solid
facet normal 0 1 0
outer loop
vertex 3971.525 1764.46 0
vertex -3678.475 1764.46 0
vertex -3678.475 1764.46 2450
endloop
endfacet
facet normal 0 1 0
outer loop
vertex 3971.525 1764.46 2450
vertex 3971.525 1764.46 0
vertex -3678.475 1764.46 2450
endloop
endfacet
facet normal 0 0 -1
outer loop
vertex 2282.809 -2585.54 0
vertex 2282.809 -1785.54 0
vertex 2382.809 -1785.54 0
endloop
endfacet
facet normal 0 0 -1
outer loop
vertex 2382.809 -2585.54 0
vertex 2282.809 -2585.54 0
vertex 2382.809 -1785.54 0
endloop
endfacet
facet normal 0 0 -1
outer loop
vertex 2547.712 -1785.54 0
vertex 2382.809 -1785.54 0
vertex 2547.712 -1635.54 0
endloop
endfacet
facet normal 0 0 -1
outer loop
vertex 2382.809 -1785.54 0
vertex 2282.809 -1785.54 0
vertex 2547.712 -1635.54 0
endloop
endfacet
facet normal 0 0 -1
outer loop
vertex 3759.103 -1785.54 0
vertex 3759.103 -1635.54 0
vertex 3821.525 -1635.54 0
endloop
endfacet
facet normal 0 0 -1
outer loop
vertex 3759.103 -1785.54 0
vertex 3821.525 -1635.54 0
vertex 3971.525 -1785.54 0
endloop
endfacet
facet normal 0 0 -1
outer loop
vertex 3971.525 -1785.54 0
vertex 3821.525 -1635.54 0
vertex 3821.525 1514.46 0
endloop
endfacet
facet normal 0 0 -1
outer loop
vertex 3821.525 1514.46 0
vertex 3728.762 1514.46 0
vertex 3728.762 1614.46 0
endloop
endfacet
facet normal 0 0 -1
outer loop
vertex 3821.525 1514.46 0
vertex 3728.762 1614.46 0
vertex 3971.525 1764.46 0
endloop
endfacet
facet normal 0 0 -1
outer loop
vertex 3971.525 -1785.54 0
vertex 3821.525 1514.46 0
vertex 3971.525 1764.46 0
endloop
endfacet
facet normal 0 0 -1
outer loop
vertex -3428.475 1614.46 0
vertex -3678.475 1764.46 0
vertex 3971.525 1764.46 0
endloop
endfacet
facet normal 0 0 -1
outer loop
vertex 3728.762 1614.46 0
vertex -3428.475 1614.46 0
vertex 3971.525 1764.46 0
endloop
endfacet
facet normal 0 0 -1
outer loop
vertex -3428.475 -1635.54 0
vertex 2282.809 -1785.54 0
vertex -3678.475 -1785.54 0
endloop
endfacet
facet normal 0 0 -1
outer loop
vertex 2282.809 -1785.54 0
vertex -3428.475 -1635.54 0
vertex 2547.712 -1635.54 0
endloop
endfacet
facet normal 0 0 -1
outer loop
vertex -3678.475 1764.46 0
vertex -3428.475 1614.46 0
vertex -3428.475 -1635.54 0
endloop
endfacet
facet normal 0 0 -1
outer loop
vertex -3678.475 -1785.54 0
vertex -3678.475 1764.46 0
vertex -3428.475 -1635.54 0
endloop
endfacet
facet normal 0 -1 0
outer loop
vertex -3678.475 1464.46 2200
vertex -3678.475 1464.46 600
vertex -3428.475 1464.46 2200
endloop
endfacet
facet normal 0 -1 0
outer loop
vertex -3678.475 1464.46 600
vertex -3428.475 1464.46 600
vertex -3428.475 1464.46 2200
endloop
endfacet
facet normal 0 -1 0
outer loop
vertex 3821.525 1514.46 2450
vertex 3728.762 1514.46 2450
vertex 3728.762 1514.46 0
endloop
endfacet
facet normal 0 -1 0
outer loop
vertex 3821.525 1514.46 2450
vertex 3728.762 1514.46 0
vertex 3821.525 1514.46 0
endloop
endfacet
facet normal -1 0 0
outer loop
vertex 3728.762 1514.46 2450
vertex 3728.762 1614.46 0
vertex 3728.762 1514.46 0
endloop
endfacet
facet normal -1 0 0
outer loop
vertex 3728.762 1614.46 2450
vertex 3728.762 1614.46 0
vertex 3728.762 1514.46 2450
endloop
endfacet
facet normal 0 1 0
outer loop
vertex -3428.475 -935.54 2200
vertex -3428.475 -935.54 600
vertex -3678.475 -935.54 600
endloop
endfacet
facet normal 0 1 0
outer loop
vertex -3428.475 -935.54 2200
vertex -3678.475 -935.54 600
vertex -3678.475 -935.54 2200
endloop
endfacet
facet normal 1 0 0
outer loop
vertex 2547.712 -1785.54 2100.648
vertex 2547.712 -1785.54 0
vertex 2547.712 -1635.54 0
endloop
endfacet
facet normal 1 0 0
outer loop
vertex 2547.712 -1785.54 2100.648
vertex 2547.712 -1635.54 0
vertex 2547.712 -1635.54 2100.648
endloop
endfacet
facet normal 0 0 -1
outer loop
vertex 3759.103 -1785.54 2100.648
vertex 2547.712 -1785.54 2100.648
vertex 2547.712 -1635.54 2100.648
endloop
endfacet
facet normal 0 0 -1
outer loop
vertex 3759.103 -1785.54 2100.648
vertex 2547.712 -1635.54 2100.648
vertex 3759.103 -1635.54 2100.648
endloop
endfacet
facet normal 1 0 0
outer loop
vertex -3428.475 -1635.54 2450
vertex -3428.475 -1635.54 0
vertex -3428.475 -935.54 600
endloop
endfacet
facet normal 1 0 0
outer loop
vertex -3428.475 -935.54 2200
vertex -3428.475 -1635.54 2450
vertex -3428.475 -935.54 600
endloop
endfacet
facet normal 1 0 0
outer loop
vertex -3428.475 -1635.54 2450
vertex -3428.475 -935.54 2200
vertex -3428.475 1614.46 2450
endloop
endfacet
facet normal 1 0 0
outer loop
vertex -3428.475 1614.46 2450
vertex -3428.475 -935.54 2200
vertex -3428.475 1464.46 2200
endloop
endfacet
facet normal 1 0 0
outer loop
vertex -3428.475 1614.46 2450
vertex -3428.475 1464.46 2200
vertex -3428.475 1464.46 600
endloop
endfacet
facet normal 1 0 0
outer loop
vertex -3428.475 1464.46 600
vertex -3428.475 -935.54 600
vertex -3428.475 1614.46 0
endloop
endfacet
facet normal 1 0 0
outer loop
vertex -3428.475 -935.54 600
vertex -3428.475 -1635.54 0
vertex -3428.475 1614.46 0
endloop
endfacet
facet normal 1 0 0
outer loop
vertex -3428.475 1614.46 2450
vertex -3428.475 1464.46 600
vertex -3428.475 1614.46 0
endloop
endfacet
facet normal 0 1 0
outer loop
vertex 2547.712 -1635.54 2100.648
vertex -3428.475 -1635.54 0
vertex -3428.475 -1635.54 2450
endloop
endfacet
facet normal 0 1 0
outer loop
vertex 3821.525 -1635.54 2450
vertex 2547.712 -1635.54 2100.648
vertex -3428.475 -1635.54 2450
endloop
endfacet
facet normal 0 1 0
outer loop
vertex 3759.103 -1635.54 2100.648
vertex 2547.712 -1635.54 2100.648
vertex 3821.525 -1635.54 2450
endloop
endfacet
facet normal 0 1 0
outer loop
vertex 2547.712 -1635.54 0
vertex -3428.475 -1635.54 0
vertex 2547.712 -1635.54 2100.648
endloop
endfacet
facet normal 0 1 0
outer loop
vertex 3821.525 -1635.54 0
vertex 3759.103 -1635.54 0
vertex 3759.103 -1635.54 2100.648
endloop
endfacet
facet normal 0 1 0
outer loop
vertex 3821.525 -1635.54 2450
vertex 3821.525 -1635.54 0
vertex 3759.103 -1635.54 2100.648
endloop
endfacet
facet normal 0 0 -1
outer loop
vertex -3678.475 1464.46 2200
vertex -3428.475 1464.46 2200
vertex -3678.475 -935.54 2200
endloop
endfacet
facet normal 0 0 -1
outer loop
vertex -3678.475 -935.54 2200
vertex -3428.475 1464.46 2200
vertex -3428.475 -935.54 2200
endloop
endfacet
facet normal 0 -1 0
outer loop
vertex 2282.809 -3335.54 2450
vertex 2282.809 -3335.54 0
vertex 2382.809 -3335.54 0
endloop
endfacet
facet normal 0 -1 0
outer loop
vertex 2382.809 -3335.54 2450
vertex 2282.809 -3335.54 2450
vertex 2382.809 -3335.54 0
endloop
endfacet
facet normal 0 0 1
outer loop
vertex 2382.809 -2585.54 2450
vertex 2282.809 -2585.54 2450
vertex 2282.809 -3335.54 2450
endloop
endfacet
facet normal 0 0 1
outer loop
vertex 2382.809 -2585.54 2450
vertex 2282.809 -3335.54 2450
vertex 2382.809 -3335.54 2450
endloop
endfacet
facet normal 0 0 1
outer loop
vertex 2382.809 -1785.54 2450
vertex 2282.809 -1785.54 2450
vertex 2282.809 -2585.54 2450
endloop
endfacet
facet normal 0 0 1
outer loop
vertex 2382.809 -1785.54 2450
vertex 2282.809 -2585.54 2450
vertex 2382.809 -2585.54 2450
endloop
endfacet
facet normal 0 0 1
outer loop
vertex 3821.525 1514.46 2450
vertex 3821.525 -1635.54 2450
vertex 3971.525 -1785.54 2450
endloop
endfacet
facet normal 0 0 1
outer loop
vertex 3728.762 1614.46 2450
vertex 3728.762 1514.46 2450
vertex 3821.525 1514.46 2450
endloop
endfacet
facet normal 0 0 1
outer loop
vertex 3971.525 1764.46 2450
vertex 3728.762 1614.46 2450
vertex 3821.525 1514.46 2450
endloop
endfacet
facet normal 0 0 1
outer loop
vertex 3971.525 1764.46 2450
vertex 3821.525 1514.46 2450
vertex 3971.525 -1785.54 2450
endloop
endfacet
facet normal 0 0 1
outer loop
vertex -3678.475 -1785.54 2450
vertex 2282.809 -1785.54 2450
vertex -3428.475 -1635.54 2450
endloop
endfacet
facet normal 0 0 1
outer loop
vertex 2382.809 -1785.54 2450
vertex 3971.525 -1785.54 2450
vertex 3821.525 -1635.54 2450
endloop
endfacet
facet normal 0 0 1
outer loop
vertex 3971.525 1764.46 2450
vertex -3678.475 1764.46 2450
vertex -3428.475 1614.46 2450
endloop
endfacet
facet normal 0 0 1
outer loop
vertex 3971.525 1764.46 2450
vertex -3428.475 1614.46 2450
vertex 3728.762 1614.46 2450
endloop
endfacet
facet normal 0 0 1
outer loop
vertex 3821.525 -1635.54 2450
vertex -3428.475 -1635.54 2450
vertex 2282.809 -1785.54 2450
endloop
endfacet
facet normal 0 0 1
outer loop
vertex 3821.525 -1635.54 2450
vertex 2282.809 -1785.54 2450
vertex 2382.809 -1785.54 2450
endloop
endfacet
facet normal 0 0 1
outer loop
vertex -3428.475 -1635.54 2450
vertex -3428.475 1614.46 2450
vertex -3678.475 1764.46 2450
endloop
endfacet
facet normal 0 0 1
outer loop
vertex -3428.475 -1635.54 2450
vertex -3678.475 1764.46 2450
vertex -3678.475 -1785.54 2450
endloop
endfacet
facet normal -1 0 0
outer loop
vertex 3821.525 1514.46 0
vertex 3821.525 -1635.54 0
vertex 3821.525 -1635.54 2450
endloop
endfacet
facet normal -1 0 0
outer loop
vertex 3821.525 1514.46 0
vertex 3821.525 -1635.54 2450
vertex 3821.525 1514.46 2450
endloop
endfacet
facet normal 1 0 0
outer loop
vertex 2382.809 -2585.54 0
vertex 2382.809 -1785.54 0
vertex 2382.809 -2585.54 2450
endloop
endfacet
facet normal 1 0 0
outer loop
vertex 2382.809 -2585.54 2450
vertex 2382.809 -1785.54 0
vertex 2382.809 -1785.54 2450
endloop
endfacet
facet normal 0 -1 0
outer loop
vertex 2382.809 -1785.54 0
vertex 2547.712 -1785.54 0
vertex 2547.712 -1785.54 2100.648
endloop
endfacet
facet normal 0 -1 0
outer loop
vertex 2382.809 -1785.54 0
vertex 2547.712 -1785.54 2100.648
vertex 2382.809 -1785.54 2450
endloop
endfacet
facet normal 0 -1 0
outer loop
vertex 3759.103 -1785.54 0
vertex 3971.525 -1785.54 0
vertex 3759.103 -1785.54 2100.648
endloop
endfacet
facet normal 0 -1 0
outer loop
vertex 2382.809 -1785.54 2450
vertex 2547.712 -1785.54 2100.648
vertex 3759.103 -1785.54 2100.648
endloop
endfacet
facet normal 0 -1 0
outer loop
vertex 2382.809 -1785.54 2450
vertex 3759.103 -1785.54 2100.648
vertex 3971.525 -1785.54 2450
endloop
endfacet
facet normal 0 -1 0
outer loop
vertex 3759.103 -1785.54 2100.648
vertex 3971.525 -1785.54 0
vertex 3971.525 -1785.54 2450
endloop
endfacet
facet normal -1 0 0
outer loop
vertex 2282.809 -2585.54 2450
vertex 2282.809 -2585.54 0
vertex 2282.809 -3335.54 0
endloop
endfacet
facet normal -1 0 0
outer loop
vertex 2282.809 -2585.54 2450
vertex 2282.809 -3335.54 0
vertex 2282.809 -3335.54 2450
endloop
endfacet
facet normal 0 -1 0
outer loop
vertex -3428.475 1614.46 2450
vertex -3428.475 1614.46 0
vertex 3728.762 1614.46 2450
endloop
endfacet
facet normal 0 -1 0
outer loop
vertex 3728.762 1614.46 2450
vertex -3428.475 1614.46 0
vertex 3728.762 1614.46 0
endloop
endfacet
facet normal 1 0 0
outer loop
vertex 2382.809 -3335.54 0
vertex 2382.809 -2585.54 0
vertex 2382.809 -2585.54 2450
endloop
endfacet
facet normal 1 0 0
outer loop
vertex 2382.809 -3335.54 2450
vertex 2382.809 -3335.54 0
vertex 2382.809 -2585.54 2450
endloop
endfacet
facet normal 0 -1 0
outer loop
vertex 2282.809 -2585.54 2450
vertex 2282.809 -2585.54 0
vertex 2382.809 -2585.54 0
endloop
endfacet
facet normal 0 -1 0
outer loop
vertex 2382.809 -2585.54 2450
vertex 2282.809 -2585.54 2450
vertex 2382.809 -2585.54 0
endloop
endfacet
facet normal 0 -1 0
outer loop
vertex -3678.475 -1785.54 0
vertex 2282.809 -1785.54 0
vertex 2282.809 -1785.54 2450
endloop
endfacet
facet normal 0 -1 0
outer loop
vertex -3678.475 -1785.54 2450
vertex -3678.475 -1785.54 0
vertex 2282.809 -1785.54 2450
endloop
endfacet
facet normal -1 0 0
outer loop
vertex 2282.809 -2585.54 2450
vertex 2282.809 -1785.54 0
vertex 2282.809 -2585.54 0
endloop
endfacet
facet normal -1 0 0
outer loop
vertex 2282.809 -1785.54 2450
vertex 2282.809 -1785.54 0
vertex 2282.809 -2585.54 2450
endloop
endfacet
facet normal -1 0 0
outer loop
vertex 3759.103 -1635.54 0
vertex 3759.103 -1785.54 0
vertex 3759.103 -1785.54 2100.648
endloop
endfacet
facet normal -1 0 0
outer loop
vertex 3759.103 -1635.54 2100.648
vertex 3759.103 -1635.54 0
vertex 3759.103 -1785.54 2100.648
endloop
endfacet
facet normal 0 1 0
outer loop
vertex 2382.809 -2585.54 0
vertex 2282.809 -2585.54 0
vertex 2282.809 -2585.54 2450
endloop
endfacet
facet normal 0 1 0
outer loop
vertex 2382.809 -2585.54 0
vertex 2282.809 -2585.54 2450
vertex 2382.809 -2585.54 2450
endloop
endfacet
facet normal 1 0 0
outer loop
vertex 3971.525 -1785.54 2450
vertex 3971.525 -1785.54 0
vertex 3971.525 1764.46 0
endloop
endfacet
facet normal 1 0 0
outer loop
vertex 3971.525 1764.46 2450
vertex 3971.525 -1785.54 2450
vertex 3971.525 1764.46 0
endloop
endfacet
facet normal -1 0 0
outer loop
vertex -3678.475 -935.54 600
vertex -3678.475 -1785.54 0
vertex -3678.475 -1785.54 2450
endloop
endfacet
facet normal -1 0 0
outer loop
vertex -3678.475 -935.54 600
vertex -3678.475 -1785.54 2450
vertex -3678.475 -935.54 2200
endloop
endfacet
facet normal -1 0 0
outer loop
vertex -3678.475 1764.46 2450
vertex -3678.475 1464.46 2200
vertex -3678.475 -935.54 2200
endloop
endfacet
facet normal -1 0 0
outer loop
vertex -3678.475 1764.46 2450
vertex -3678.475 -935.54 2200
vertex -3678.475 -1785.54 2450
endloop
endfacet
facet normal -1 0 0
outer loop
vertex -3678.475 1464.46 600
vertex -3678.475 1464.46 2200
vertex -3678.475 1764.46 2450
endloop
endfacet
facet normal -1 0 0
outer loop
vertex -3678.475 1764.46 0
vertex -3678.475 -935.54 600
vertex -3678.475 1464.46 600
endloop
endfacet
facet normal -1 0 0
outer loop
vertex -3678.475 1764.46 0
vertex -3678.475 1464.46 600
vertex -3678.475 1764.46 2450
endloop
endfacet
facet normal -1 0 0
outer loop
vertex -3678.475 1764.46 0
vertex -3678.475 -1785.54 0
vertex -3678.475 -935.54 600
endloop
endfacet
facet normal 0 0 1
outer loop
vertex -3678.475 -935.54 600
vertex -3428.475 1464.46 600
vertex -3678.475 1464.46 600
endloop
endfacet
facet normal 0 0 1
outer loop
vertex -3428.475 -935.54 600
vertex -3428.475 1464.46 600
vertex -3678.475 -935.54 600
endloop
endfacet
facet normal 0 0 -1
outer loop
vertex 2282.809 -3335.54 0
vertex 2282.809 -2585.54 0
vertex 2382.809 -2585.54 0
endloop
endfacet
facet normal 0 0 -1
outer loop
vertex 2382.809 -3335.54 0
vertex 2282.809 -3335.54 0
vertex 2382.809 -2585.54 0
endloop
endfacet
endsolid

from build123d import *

# Parameters (mm, degrees)
F0_W      = 7550
F0_H      = 3550
F0_W_2    = 7250
F0_H_2    = 3250
F1_DEPTH  = 2450
F2_W      = 1211.3902568817
F2_H      = 2100.6481647491
F3_DEPTH  = 150
F4_W      = 2400
F4_H      = 1600
F5_DEPTH  = 150
F6_DEPTH  = 100
F7_W      = 92.7624866187
F7_H      = 2450
F8_DEPTH  = 100
F9_W      = 100
F9_H      = 2450
F10_DEPTH = 800
F11_DEPTH = 750


with BuildPart() as f1:
    # F0 (on Top) → F1 (new body)
    with BuildSketch(Plane.XY):
        with Locations((196.5246364295, -10.5402395129)):
            Rectangle(F0_W, F0_H)
        with Locations((196.5246364295, -10.5402395129)):
            Rectangle(F0_W_2, F0_H_2, mode=Mode.SUBTRACT)
    extrude(amount=F1_DEPTH)

    # F2 (on face) → F3 (cut)
    with BuildSketch(Plane.XZ.offset(1785.5402395129)):
        with Locations((3153.4074544907, 1050.3240823746)):
            Rectangle(F2_W, F2_H)
    extrude(amount=-F3_DEPTH, mode=Mode.SUBTRACT)

    # F4 (on face) → F5 (cut)
    with BuildSketch(Plane(origin=(-3578.4753635705, 0, 0), x_dir=(0, -1, 0), z_dir=(-1, 0, 0))):
        with Locations((-264.4597604871, 1400)):
            Rectangle(F4_W, F4_H)
    extrude(amount=-F5_DEPTH, mode=Mode.SUBTRACT)

    # F6 (add): a face of the model
    f6_faces = [f1.faces().sort_by_distance(p)[0] for p in [
        (-3578.4753635705, 1721.3262468347, 1225),
    ]]
    extrude(f6_faces, amount=F6_DEPTH)

    # F7 (on face) → F8 (join)
    with BuildSketch(Plane.XZ.offset(-1614.4597604871)):
        with Locations((3775.1433931202, 1225)):
            Rectangle(F7_W, F7_H)
    extrude(amount=F8_DEPTH)

    # F9 (on face) → F10 (join)
    with BuildSketch(Plane.XZ.offset(1785.5402395129)):
        with Locations((2332.8089237213, 1225)):
            Rectangle(F9_W, F9_H)
    extrude(amount=F10_DEPTH)


with BuildPart() as f11:
    # F11 (new): a face of the model
    f11_faces = [f1.part.faces().sort_by_distance(p)[0] for p in [
        (2332.8089237213, -2585.5402395129, 1225),
    ]]
    extrude(f11_faces, amount=F11_DEPTH)


solid = Compound([f1.part, f11.part])
